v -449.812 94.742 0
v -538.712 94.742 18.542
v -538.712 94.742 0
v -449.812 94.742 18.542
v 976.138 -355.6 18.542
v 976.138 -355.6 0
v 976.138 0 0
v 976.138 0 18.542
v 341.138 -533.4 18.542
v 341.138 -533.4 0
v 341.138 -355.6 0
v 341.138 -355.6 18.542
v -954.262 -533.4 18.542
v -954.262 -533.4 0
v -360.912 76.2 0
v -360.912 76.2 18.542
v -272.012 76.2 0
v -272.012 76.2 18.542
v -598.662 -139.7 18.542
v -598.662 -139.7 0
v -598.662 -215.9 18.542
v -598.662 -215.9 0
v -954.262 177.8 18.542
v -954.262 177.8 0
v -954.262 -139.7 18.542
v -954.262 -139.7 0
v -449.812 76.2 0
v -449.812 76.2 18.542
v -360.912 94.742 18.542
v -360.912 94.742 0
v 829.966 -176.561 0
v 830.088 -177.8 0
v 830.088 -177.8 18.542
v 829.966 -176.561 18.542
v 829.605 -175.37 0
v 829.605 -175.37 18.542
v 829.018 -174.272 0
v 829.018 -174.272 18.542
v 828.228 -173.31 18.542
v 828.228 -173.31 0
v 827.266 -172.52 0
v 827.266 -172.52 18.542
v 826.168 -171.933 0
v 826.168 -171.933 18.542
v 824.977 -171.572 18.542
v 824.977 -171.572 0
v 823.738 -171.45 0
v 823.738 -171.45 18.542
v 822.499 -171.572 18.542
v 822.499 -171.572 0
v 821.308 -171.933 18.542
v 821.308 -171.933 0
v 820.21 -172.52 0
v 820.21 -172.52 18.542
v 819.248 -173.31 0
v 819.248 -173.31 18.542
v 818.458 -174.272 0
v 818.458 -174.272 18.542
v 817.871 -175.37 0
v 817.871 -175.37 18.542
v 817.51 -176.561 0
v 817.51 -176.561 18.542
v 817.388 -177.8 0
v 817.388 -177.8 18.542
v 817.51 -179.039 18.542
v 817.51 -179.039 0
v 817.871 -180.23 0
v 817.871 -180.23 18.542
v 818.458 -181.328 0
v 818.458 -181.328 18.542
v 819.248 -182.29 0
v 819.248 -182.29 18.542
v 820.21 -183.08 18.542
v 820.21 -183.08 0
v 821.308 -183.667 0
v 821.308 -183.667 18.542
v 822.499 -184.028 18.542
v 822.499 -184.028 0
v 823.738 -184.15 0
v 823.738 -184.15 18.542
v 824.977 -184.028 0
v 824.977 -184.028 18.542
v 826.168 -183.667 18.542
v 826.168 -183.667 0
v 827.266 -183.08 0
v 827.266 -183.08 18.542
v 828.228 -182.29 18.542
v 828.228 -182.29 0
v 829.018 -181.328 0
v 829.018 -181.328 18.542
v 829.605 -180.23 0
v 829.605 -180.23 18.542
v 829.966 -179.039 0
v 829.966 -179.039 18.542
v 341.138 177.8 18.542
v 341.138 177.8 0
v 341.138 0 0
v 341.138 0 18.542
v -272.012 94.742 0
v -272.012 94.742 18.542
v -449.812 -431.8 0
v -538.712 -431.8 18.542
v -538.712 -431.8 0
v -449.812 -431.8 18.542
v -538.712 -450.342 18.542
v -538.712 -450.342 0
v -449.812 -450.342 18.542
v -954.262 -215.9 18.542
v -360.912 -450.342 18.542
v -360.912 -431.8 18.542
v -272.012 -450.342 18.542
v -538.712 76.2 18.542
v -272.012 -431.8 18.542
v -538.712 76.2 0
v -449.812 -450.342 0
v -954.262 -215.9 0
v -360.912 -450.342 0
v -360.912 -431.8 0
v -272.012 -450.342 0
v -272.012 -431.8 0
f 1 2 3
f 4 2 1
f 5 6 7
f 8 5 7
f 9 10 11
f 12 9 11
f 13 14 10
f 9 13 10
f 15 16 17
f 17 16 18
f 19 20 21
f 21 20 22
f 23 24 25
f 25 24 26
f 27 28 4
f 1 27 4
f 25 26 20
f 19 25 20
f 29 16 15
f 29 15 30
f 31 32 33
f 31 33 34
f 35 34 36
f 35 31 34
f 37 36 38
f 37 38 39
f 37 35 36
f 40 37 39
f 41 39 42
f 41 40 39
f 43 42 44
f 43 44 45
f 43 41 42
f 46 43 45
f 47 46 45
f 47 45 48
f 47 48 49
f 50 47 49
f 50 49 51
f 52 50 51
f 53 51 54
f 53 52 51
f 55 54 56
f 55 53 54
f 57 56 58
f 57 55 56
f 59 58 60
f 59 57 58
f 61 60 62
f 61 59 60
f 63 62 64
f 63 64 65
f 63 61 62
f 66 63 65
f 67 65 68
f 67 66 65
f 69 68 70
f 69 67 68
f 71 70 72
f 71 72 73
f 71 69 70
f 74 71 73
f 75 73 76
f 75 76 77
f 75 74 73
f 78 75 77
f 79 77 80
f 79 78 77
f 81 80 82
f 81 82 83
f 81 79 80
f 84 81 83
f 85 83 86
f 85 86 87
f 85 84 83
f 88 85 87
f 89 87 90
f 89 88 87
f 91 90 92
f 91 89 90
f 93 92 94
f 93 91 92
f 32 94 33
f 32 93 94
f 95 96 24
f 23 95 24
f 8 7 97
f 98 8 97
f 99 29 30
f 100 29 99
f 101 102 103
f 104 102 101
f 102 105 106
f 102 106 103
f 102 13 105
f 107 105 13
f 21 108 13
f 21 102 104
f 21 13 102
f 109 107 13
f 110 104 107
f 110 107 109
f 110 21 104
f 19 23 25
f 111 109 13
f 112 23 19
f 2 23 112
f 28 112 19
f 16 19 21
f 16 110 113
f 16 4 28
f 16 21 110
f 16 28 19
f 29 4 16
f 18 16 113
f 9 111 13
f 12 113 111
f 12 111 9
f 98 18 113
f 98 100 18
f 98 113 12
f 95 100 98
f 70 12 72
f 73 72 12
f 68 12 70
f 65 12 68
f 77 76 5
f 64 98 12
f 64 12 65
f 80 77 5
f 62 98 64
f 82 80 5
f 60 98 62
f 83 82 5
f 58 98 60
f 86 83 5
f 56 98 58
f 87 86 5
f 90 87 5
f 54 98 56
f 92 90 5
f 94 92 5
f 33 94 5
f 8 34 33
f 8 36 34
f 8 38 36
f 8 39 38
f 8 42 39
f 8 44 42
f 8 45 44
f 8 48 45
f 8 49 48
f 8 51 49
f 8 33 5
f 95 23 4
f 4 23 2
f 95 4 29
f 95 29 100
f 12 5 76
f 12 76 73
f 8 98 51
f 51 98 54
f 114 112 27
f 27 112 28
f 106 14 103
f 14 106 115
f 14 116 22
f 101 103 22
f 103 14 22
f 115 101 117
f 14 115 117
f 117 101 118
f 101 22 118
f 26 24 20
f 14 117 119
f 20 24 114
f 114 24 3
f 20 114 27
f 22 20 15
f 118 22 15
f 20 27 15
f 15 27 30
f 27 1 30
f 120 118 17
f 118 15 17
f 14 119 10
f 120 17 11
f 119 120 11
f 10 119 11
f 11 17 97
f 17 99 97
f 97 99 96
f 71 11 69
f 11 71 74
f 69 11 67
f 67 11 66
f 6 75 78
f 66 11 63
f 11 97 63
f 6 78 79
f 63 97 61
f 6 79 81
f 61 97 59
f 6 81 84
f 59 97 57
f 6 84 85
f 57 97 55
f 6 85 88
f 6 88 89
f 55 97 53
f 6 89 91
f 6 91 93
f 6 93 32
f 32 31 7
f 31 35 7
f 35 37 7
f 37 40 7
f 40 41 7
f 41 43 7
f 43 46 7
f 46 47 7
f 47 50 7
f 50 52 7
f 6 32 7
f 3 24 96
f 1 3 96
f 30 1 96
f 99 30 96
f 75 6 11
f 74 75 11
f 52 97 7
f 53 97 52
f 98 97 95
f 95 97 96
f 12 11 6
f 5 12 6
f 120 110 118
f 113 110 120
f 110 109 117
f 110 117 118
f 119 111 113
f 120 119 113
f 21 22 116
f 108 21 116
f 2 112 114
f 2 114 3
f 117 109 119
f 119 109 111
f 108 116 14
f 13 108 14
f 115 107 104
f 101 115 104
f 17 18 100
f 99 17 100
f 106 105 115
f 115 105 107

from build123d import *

# Parameters (mm, degrees)
F0_R     = 6.35
F1_DEPTH = 18.542
F2_W     = 88.9
F2_H     = 18.542
F3_DEPTH = 25.4


with BuildPart() as f1:
    # F0 (on Top) → F1 (new body)
    with BuildSketch(Plane.XY):
        Polygon((341.138078, 177.8), (-954.261922, 177.8), (-954.261922, -139.7), (-598.661922, -139.7), (-598.661922, -215.9), (-954.261922, -215.9), (-954.261922, -533.4), (341.138078, -533.4), (341.138078, -355.6), (976.138078, -355.6), (976.138078, 0), (341.138078, 0), align=None)
        with Locations((823.738078, -177.8)):
            Circle(F0_R, mode=Mode.SUBTRACT)
    extrude(amount=F1_DEPTH)

    # F2 (on face) → F3 (cut)
    with BuildSketch(Plane.XY.offset(18.542)):
        with Locations((-494.261886, -441.071)):
            Rectangle(F2_W, F2_H)
        with Locations((-494.261886, 85.471)):
            Rectangle(F2_W, F2_H)
        with Locations((-316.461886, -441.071)):
            Rectangle(F2_W, F2_H)
        with Locations((-316.461886, 85.471)):
            Rectangle(F2_W, F2_H)
    extrude(amount=-F3_DEPTH, mode=Mode.SUBTRACT)


solid = f1.part
